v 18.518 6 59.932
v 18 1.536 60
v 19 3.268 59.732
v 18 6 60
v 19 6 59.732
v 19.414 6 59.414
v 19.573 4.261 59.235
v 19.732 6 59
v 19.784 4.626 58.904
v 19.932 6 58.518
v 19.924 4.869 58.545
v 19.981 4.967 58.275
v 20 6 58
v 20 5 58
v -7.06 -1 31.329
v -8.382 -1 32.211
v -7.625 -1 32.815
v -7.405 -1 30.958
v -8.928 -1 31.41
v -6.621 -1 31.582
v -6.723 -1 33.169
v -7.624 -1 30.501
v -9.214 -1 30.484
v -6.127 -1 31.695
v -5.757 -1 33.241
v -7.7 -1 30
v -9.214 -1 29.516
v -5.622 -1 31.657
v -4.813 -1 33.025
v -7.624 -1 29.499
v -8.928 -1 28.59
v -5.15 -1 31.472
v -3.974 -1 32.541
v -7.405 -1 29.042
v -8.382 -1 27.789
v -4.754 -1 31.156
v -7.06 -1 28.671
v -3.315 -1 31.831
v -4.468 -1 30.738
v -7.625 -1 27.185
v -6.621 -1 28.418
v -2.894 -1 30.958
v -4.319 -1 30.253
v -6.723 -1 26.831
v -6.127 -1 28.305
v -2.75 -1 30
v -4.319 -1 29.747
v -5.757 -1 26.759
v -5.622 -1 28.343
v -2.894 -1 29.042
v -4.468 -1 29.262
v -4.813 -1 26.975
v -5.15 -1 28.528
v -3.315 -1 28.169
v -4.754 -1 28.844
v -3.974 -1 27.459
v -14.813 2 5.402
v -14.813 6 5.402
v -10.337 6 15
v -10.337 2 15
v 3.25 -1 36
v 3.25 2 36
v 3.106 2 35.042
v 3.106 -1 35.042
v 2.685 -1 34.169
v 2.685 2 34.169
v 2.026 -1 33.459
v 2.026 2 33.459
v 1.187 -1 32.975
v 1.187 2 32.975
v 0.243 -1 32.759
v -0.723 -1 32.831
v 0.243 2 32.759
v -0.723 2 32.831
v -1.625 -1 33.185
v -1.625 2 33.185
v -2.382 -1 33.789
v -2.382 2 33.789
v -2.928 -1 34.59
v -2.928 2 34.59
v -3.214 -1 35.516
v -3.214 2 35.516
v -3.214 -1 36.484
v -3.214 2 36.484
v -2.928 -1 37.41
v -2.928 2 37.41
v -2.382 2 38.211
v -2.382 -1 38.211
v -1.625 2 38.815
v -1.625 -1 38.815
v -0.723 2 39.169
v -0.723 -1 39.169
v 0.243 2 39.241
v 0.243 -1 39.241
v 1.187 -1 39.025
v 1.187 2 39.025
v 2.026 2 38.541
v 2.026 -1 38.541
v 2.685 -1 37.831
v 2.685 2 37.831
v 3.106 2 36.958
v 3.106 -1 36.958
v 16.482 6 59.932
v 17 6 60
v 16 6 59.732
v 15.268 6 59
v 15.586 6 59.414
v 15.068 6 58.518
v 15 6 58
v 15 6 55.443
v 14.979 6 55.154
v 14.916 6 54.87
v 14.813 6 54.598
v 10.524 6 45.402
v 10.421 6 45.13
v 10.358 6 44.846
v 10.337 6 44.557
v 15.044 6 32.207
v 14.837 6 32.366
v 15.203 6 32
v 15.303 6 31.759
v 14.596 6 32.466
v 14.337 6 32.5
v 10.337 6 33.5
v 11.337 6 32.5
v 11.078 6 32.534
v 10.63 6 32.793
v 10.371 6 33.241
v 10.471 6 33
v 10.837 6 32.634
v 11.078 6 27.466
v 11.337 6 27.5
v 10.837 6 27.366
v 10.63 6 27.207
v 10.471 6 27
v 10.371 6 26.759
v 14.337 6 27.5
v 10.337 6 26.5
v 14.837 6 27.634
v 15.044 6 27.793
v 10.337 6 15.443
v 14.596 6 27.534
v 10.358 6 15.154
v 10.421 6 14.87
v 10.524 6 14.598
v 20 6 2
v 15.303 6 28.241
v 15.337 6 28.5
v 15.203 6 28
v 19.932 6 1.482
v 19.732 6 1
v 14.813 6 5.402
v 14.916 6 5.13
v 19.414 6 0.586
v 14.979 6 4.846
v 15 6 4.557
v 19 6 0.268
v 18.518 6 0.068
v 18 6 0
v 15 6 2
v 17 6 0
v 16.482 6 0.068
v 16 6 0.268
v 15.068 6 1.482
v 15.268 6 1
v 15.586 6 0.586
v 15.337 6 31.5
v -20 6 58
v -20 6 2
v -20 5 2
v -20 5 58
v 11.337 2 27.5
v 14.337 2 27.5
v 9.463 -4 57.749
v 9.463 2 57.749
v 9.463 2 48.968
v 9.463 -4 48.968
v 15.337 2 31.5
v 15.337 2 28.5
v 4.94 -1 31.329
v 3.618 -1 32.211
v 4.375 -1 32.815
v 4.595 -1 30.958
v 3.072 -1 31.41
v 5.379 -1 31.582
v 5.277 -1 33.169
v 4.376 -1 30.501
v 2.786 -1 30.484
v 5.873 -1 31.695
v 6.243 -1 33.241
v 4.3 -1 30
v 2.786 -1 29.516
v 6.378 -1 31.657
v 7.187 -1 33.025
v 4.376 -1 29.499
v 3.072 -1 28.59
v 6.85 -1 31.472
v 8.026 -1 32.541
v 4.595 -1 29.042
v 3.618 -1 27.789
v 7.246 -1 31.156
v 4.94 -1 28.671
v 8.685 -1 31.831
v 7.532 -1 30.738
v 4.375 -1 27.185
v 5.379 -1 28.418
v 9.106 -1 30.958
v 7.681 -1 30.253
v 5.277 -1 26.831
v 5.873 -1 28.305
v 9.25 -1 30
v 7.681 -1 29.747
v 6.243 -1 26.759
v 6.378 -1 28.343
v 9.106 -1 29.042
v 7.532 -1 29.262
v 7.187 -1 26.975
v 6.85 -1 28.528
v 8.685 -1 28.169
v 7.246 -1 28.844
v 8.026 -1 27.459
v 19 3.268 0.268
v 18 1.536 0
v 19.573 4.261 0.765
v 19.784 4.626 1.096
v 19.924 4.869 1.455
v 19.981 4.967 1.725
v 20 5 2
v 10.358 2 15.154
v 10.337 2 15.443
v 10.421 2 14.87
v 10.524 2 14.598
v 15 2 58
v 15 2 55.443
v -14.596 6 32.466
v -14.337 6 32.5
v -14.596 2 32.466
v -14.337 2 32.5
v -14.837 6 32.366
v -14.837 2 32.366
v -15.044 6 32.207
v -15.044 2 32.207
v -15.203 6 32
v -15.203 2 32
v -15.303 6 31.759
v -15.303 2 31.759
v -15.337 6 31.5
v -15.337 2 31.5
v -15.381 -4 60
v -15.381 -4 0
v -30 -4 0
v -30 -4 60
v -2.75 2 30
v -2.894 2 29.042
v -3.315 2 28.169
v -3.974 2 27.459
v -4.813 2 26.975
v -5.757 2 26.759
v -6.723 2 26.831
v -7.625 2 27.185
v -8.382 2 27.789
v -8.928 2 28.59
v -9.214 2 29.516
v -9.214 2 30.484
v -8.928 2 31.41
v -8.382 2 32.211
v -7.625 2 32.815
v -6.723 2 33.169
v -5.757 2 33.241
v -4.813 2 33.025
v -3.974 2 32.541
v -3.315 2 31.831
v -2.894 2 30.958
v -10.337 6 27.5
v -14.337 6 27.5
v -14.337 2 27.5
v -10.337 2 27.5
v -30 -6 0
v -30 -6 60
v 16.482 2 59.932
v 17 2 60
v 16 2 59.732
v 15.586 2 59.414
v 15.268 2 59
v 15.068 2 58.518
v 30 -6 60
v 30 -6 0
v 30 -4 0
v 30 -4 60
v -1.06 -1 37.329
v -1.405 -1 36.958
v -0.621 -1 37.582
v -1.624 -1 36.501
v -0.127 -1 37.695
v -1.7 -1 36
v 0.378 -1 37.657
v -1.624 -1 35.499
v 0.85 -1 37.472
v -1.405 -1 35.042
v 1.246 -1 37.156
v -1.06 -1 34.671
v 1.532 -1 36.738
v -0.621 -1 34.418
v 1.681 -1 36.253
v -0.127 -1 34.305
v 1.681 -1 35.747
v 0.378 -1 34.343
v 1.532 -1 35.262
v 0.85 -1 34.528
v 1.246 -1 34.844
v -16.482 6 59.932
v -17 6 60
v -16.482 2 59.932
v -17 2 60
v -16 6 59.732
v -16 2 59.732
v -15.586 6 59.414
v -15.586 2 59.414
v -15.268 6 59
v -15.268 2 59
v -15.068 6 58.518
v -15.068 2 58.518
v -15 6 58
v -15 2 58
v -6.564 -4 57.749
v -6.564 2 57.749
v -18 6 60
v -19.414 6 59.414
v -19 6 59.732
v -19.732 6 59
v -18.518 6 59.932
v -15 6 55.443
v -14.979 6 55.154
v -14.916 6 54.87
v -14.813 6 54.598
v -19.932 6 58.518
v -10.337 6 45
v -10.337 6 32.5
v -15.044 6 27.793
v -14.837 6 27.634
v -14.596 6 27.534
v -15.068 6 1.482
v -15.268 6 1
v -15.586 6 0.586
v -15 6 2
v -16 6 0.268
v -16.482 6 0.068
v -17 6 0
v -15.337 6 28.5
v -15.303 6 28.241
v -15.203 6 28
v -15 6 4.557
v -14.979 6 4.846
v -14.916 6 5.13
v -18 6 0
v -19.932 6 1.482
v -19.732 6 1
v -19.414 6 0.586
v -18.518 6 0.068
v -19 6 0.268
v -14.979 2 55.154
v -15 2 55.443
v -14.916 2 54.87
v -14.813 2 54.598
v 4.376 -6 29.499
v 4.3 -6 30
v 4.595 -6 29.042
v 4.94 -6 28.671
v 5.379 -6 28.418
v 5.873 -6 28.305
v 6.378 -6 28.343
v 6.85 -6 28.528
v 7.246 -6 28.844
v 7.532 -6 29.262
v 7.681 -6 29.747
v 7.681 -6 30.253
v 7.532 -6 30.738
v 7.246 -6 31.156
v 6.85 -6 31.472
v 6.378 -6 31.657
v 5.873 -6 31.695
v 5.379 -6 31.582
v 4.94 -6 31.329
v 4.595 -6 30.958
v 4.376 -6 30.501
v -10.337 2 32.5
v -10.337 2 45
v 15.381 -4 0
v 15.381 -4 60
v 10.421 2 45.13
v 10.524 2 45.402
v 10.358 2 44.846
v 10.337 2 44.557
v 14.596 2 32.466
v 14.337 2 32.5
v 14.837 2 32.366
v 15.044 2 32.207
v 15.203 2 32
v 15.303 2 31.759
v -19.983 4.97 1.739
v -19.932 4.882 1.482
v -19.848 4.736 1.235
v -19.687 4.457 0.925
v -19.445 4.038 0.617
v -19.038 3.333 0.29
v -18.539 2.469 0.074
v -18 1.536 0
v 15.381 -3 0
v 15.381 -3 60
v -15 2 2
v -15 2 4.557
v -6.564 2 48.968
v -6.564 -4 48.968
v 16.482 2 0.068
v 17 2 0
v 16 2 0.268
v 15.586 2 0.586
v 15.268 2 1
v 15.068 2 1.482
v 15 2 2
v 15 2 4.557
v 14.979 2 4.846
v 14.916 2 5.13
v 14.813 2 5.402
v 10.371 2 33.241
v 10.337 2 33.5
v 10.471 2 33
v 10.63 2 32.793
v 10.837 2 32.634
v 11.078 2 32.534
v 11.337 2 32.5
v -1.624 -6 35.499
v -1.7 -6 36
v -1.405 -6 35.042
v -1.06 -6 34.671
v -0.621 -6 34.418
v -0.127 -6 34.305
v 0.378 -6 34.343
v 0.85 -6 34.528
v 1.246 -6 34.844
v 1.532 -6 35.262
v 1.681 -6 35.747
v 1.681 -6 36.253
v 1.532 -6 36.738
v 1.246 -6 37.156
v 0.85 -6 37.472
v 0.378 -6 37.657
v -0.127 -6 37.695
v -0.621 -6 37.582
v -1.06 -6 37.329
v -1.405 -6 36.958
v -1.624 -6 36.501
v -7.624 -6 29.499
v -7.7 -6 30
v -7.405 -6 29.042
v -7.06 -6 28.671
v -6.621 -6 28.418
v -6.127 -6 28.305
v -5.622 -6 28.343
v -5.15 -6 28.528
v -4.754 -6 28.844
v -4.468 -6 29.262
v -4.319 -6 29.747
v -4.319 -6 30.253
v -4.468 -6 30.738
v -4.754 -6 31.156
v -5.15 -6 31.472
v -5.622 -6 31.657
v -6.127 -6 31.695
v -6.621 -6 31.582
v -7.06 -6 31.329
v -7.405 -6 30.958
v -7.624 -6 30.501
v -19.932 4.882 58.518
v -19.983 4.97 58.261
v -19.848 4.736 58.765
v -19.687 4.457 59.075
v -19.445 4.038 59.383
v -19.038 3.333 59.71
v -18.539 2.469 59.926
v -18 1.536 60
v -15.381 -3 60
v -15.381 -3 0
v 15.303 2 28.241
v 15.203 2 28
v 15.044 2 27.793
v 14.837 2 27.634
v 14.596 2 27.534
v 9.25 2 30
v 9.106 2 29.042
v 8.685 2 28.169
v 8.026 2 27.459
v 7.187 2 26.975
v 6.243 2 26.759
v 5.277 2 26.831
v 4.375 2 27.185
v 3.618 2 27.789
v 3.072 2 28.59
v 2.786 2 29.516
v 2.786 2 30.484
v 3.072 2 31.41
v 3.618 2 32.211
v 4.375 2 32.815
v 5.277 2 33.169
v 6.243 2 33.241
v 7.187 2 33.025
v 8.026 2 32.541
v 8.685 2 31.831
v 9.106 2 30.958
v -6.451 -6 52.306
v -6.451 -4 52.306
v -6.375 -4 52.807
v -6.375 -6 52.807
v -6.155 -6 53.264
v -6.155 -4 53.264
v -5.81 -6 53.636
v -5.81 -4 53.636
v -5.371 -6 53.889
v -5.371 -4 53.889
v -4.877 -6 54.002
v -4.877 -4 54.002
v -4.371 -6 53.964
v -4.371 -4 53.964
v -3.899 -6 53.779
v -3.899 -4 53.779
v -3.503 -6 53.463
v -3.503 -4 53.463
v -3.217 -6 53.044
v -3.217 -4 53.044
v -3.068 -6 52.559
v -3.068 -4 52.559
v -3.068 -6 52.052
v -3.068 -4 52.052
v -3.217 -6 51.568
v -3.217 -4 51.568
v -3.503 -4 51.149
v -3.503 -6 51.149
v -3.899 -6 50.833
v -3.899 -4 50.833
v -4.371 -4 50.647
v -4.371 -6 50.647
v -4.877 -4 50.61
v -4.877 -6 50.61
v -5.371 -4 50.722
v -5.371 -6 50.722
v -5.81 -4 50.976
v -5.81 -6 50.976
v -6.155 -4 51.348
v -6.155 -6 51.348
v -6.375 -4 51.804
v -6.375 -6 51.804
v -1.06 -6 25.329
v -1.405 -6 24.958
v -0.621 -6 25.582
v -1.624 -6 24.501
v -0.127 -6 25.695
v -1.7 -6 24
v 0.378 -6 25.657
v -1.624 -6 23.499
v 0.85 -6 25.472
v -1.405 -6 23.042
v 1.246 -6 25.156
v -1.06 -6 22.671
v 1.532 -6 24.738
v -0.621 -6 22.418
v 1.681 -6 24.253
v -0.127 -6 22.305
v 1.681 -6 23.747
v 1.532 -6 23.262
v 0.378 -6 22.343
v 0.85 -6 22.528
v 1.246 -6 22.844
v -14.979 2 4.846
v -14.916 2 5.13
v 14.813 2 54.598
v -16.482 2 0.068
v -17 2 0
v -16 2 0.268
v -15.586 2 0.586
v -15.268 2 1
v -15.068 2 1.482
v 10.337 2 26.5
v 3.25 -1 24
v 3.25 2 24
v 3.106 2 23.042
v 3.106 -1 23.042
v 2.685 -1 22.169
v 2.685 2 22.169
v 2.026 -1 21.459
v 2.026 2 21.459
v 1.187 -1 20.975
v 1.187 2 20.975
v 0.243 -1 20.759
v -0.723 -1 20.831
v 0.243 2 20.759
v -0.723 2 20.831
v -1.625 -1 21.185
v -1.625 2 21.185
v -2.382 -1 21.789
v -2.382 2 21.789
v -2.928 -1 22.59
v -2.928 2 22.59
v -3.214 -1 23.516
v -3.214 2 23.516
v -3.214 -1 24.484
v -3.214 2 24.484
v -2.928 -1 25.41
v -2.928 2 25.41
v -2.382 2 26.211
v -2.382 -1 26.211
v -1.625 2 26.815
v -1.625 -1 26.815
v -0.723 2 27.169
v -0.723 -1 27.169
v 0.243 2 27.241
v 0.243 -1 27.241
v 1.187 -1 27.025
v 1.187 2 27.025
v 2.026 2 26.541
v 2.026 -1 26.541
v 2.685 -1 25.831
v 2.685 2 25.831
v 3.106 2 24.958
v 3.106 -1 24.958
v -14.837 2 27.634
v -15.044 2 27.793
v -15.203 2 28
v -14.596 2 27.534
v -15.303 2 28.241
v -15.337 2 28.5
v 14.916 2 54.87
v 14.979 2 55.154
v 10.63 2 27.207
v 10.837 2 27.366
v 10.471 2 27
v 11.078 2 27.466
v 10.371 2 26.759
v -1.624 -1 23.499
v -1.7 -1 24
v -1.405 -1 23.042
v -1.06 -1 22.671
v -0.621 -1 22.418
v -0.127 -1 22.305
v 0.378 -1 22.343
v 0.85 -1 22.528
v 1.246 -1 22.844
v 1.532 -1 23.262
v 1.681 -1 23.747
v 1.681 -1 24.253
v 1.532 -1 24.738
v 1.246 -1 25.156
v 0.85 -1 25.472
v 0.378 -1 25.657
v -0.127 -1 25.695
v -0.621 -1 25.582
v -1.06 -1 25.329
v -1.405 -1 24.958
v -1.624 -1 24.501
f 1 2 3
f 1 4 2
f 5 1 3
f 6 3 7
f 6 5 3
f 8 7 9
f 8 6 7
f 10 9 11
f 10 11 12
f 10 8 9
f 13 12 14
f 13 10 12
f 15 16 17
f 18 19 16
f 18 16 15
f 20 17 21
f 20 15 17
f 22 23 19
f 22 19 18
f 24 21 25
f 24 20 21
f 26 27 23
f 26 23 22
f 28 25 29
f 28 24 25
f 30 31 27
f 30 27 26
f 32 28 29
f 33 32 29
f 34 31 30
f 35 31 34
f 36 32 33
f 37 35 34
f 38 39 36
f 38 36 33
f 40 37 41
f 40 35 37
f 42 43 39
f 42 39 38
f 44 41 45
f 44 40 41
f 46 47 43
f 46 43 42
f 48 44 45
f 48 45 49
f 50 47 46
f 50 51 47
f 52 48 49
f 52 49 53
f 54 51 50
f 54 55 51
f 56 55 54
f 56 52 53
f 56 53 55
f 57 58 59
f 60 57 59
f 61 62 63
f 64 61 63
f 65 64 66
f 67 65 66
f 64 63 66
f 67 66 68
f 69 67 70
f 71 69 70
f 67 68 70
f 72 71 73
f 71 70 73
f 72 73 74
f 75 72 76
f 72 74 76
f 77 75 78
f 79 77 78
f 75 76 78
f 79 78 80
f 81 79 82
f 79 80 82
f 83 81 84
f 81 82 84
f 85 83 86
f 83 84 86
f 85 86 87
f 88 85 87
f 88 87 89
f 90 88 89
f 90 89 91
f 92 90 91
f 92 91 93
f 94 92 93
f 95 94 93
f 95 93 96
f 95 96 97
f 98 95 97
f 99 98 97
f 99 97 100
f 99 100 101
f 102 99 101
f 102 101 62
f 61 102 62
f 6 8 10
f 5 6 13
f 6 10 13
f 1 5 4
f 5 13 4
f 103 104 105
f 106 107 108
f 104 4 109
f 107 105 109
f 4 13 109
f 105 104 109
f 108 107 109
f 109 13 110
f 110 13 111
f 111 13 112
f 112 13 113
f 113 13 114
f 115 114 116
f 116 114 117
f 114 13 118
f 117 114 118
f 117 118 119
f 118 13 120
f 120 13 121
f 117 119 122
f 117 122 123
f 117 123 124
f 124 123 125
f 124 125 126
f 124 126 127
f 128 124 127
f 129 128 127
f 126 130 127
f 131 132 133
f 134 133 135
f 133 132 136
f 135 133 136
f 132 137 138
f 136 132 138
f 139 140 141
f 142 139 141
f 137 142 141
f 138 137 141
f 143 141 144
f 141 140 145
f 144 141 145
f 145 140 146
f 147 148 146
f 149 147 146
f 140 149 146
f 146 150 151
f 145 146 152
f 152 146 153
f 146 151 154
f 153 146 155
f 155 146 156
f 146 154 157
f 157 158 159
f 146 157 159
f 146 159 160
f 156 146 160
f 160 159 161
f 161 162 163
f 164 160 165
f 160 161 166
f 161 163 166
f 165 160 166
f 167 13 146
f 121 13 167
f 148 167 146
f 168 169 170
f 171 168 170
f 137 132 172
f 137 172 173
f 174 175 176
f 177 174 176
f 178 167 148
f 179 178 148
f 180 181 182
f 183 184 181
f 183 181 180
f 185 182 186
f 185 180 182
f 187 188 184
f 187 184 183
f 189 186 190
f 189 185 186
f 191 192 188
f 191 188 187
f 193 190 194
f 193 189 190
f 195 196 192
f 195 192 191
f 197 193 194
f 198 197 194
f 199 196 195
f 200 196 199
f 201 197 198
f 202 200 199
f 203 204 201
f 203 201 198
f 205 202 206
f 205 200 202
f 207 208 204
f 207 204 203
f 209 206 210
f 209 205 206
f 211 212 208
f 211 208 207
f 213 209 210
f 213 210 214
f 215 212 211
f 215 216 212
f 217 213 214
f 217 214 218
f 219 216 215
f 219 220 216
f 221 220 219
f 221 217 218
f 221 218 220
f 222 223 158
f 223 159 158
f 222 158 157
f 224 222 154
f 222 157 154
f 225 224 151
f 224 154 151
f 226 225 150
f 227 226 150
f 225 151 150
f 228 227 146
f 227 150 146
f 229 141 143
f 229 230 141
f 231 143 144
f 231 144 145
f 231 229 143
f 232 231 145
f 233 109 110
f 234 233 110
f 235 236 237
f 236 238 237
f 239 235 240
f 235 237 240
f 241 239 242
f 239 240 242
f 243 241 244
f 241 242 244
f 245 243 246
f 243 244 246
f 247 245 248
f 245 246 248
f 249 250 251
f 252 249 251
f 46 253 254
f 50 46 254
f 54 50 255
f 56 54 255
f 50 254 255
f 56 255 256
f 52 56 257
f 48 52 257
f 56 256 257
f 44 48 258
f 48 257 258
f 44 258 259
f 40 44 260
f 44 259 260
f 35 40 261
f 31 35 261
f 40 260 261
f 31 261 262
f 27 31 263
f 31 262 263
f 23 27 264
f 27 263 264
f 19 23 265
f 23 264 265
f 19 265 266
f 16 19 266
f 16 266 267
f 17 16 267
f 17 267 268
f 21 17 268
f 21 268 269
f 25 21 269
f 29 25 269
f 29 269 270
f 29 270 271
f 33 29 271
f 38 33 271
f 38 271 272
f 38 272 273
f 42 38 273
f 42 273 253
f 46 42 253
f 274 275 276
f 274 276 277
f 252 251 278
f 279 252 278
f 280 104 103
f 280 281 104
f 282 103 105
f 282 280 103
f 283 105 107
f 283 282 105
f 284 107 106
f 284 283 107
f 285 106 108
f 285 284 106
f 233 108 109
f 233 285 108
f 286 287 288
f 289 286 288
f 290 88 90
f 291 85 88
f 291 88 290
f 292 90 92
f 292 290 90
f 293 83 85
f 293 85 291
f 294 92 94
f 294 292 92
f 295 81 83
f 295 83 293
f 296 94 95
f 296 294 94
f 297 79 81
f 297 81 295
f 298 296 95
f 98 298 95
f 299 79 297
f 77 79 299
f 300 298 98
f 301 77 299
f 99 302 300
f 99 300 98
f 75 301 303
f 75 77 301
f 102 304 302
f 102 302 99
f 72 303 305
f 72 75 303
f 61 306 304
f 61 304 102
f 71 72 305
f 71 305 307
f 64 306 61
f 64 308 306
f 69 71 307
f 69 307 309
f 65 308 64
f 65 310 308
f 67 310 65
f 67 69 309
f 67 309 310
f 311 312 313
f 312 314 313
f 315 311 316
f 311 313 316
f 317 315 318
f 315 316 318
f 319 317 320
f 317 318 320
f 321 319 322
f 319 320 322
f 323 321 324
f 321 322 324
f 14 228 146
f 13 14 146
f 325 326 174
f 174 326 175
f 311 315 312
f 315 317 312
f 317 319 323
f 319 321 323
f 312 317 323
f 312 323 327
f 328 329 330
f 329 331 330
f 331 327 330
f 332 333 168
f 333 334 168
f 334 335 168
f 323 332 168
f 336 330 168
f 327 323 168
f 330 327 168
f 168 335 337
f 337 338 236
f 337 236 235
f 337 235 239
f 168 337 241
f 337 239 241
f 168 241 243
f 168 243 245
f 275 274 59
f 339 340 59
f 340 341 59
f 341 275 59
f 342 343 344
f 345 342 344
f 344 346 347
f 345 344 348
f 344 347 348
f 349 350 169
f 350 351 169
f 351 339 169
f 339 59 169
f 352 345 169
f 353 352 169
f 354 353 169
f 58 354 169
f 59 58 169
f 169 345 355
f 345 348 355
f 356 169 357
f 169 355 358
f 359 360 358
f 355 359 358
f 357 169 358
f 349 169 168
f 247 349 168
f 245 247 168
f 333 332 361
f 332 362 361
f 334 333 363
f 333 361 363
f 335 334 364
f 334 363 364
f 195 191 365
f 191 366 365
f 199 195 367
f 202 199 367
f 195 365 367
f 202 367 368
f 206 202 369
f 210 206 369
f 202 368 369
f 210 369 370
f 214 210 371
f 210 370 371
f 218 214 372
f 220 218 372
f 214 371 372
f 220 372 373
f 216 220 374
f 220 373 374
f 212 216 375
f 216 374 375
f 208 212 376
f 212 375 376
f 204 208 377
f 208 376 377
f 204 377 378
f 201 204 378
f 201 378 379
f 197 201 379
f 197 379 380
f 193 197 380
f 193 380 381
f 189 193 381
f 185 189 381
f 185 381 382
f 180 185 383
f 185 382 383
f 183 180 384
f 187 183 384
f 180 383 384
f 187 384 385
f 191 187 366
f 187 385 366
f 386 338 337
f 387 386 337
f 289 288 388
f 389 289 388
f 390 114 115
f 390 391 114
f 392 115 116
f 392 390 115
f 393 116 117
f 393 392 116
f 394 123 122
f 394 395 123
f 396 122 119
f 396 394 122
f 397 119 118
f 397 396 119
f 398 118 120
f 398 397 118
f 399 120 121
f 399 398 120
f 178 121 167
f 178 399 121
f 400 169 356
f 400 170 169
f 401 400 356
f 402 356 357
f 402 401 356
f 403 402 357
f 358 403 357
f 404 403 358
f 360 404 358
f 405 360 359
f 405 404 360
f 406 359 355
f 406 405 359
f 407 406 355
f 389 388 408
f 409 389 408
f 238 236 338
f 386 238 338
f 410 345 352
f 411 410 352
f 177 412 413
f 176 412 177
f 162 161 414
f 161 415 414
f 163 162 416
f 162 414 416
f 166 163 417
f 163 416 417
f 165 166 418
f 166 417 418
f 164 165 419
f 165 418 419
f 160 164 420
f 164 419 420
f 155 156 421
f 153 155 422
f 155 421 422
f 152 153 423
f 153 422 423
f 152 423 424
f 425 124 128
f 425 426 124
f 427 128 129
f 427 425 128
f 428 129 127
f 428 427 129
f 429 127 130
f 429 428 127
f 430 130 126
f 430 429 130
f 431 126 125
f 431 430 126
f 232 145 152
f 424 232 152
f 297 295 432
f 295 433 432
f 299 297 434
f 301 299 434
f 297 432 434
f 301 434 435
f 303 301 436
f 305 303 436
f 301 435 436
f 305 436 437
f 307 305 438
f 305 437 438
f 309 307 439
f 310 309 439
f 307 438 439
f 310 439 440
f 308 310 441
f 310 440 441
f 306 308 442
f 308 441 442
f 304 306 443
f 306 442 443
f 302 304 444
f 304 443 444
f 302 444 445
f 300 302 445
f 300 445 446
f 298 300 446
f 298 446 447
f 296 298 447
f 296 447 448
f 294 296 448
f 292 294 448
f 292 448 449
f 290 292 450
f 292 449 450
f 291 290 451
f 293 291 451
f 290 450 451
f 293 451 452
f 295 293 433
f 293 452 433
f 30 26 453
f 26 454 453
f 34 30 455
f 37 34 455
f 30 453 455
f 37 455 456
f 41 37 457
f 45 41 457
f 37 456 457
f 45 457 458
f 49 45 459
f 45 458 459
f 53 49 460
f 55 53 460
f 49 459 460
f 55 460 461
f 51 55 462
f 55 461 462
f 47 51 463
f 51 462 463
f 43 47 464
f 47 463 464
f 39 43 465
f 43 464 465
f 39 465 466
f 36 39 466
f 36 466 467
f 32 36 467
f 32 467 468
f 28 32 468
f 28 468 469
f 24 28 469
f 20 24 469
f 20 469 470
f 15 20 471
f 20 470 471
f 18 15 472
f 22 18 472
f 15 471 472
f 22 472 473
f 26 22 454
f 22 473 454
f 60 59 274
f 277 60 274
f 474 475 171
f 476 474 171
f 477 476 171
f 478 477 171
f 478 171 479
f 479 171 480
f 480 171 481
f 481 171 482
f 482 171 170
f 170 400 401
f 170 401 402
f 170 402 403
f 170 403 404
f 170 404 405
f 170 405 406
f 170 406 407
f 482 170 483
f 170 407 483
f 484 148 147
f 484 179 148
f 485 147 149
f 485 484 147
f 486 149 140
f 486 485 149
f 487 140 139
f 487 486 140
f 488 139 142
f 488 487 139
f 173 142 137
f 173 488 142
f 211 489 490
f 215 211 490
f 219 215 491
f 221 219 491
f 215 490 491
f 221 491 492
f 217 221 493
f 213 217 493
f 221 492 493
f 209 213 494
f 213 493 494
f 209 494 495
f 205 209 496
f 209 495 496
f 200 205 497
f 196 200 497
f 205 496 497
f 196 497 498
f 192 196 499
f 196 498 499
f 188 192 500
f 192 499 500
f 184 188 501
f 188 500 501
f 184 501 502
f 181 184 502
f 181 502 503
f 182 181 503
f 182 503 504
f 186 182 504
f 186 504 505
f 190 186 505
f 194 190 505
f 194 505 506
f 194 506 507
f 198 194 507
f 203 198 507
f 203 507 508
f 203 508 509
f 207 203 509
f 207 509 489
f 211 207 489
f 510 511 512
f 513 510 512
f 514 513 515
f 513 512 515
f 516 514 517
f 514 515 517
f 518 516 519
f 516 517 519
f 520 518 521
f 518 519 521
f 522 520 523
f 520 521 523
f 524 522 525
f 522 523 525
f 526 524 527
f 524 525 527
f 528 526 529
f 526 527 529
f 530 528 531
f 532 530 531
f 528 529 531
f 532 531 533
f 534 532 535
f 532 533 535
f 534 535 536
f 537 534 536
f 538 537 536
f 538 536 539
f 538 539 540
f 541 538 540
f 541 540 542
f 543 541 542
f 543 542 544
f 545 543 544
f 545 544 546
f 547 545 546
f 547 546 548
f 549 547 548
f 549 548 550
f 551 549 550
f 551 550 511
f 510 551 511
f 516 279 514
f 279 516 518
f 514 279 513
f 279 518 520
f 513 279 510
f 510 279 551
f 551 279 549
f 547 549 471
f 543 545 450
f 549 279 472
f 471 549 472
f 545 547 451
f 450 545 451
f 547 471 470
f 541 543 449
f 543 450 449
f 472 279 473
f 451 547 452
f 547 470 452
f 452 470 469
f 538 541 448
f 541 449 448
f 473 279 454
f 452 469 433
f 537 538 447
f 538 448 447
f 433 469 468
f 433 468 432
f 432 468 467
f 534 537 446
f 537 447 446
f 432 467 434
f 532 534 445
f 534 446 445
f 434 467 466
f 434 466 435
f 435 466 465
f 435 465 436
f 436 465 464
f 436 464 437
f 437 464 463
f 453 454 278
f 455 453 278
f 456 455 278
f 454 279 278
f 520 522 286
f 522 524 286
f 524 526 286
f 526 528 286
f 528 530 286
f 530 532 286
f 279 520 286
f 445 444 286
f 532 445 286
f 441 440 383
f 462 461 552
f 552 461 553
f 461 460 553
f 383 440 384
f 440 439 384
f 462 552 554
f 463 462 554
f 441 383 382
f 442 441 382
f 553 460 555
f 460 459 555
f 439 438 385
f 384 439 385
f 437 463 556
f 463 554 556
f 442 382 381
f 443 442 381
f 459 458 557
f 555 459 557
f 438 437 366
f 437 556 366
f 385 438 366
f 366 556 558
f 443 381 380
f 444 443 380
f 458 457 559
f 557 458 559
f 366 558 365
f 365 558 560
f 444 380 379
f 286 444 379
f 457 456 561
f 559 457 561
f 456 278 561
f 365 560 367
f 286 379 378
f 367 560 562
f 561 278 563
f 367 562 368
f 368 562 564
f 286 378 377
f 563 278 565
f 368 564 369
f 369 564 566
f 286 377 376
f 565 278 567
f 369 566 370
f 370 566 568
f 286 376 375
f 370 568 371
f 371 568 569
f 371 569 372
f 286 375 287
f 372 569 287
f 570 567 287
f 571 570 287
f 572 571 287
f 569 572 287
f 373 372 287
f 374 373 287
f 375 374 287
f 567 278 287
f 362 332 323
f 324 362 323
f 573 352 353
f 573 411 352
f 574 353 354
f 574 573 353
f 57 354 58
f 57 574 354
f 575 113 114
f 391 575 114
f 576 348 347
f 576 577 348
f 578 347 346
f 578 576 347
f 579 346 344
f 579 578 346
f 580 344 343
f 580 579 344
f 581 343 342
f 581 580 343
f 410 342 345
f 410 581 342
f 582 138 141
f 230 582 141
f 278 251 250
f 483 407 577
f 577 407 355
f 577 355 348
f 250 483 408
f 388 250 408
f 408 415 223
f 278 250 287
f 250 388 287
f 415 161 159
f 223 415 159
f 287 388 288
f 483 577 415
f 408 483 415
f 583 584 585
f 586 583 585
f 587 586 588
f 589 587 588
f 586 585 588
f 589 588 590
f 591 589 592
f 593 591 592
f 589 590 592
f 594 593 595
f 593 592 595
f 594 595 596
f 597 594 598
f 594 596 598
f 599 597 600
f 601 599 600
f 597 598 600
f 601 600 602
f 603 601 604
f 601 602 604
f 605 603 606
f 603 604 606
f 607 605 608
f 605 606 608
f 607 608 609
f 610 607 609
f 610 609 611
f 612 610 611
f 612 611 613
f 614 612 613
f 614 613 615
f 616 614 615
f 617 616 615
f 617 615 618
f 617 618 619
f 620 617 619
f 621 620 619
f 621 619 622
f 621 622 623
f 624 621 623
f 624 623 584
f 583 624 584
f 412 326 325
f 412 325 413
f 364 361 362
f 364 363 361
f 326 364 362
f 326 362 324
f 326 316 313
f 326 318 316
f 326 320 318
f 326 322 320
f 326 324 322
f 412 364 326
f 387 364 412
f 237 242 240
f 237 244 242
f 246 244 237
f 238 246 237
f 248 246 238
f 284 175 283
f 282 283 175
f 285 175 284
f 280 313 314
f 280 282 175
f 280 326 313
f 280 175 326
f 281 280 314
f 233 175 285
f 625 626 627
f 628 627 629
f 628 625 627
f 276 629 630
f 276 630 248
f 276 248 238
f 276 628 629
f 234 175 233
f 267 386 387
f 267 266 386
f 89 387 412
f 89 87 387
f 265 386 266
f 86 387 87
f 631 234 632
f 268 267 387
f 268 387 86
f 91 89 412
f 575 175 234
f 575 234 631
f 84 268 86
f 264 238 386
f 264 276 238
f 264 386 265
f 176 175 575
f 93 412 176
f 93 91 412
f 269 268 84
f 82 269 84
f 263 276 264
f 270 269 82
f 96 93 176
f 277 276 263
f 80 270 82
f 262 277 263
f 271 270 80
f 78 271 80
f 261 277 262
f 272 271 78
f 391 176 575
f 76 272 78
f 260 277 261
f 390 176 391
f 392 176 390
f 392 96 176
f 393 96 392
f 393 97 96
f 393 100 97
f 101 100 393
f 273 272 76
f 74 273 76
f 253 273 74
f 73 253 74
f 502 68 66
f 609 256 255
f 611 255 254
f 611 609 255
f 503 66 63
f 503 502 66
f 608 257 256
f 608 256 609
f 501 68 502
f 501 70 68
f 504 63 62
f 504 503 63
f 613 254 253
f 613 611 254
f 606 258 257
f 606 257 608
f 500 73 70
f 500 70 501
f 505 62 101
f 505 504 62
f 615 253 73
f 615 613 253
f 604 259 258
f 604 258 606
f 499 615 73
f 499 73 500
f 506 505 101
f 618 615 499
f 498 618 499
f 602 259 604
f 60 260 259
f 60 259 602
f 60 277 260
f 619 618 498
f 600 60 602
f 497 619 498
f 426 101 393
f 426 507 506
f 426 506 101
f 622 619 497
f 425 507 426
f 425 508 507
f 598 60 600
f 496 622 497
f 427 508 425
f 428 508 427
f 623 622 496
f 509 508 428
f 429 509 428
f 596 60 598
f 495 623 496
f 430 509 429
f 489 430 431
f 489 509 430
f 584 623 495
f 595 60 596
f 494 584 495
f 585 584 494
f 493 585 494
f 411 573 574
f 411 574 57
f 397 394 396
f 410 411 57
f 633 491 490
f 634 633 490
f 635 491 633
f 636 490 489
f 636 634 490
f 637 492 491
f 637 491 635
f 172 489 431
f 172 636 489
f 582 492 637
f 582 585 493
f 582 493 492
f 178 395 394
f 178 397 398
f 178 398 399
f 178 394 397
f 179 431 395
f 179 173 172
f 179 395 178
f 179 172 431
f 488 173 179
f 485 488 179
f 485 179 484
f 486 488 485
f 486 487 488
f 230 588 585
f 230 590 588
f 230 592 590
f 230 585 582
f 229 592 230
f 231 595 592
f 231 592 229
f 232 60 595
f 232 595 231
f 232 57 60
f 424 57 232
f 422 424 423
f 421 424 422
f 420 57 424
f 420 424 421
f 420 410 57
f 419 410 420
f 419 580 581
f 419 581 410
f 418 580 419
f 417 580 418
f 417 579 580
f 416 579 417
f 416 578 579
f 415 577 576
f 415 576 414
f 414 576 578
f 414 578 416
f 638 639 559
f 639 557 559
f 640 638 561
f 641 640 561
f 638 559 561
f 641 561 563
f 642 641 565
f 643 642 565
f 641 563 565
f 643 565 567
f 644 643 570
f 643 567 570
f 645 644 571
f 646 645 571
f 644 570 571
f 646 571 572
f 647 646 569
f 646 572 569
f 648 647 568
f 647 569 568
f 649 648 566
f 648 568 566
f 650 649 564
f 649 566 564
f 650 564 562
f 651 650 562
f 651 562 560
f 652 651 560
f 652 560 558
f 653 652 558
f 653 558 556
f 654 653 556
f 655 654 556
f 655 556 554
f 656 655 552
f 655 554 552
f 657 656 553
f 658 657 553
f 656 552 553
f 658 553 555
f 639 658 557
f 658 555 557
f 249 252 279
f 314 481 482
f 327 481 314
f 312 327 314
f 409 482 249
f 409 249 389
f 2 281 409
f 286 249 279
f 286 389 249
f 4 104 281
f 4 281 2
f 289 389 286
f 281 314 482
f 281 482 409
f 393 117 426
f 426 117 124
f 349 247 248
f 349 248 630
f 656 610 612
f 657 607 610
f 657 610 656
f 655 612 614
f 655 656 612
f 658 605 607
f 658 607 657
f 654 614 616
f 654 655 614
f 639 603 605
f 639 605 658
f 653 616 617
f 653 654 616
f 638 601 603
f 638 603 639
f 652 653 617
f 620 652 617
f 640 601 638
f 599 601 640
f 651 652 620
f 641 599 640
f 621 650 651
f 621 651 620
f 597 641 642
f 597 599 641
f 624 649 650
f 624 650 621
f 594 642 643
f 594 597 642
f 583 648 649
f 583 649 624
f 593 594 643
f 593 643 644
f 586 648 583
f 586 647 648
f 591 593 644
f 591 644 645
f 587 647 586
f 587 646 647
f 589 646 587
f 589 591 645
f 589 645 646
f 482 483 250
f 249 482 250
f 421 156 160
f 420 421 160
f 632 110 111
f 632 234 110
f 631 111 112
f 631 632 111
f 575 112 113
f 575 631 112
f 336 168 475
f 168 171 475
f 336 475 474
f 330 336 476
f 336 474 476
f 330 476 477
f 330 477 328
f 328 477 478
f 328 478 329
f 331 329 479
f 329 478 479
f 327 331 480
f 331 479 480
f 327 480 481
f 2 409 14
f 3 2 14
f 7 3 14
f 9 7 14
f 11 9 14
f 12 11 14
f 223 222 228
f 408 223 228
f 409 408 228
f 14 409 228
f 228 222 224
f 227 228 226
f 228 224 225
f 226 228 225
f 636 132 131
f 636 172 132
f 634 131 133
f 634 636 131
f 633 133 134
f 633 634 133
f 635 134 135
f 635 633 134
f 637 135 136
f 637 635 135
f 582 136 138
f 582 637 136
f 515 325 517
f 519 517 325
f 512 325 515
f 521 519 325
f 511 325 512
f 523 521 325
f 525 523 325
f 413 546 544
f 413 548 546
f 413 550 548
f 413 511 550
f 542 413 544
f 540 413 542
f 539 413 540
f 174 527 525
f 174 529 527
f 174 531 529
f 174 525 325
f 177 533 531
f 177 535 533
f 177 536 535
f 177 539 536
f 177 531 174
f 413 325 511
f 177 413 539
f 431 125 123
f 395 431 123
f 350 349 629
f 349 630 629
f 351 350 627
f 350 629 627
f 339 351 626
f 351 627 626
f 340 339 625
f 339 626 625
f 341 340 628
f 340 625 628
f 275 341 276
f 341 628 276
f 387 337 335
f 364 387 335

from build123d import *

# Parameters (mm, degrees)
EXTRUDE_1_DEPTH             = 60
CUT_EXTRUDE_1_DEPTH         = 4
SKETCH_3_W                  = 5
SKETCH_3_H                  = 5
CUT_EXTRUDE_2_DEPTH         = 4
FILLET_1_R                  = 2
FILLET_2_R                  = 1
HOLE_WIZARD_M31_D           = 3.4
HOLE_WIZARD_M31_CBORE_D     = 6.5
HOLE_WIZARD_M31_CBORE_DEPTH = 3
SKETCH_9_W                  = 16.027024291
SKETCH_9_H                  = 8.780763308
CUT_EXTRUDE_4_DEPTH         = 6
SKETCH_10_R                 = 1.700955844
CUT_EXTRUDE_5_DEPTH         = 68.823299831


with BuildPart() as part:
    # Эскиз1 → Бобышка-Вытянуть1 (new body)
    with BuildSketch(Plane.XY):
        Polygon((-20, 5), (-15.381197846, -3), (-15.381197846, -4), (-30, -4), (-30, -6), (30, -6), (30, -4), (15.381197846, -4), (15.381197846, -3), (20, 5), (20, 6), (-20, 6), align=None)
    extrude(amount=EXTRUDE_1_DEPTH)

    # Эскиз2 → Вырез-Вытянуть1 (cut)
    with BuildSketch(Plane(origin=(0, 6, 0), x_dir=(1, 0, 0), z_dir=(0, 1, 0))):
        Polygon((15, 0), (-15, 0), (-15, -5), (-10.336923418, -15), (-10.336923418, -45), (-15, -55), (-15, -60), (15, -60), (15, -55), (10.336923418, -45), (10.336923418, -15), (15, -5), align=None)
    extrude(amount=-CUT_EXTRUDE_1_DEPTH, mode=Mode.SUBTRACT)

    # Эскиз3 → Вырез-Вытянуть2 (cut)
    with BuildSketch(Plane(origin=(0, 6, 0), x_dir=(1, 0, 0), z_dir=(0, 1, 0))):
        with Locations((-12.836923418, -30)):
            Rectangle(SKETCH_3_W, SKETCH_3_H)
        with Locations((12.836923418, -30)):
            Rectangle(SKETCH_3_W, SKETCH_3_H)
    extrude(amount=-CUT_EXTRUDE_2_DEPTH, mode=Mode.SUBTRACT)

    # Скругление1
    fillet_1_edges = [part.edges().sort_by_distance(p)[0] for p in [
        (20, 5.5, 0),
        (-20, 5.5, 0),
        (20, 5.5, 60),
        (-20, 5.5, 60),
        (-15, 4, 5),
        (-15, 4, 0),
        (15, 4, 0),
        (15, 4, 5),
        (10.336923418, 4, 15),
        (10.336923418, 4, 45),
        (15, 4, 55),
        (15, 4, 60),
        (-15, 4, 60),
        (-15, 4, 55),
    ]]
    fillet(fillet_1_edges, radius=FILLET_1_R)

    # Скругление2
    fillet_2_edges = [part.edges().sort_by_distance(p)[0] for p in [
        (-15.336923418, 4, 32.5),
        (-15.336923418, 4, 27.5),
        (10.336923418, 4, 27.5),
        (15.336923418, 4, 27.5),
        (15.336923418, 4, 32.5),
        (10.336923418, 4, 32.5),
    ]]
    fillet(fillet_2_edges, radius=FILLET_2_R)

    # Цековка для винта с внутренним шестигранником M31 (through all)
    with Locations(Plane(origin=(0, 2, 0), x_dir=(1, 0, 0), z_dir=(0, 1, 0))):
        with Locations((0, -24), (6, -30), (0, -36), (-6, -30)):
            CounterBoreHole(HOLE_WIZARD_M31_D / 2, HOLE_WIZARD_M31_CBORE_D / 2, HOLE_WIZARD_M31_CBORE_DEPTH)

    # Эскиз9 → Вырез-Вытянуть4 (cut)
    with BuildSketch(Plane(origin=(0, 2, 0), x_dir=(1, 0, 0), z_dir=(0, 1, 0))):
        with Locations((1.449252196, -53.358535403)):
            Rectangle(SKETCH_9_W, SKETCH_9_H)
    extrude(amount=-CUT_EXTRUDE_4_DEPTH, mode=Mode.SUBTRACT)

    # Эскиз10 → Вырез-Вытянуть5 (cut, through all)
    with BuildSketch(Plane(origin=(0, -4, 0), x_dir=(1, 0, 0), z_dir=(0, 1, 0))):
        with Locations(Location((-4.749733233, -52.305802454, 0), (0, 0, 180))):
            Circle(SKETCH_10_R)
    extrude(amount=-CUT_EXTRUDE_5_DEPTH, mode=Mode.SUBTRACT)


solid = part.part
